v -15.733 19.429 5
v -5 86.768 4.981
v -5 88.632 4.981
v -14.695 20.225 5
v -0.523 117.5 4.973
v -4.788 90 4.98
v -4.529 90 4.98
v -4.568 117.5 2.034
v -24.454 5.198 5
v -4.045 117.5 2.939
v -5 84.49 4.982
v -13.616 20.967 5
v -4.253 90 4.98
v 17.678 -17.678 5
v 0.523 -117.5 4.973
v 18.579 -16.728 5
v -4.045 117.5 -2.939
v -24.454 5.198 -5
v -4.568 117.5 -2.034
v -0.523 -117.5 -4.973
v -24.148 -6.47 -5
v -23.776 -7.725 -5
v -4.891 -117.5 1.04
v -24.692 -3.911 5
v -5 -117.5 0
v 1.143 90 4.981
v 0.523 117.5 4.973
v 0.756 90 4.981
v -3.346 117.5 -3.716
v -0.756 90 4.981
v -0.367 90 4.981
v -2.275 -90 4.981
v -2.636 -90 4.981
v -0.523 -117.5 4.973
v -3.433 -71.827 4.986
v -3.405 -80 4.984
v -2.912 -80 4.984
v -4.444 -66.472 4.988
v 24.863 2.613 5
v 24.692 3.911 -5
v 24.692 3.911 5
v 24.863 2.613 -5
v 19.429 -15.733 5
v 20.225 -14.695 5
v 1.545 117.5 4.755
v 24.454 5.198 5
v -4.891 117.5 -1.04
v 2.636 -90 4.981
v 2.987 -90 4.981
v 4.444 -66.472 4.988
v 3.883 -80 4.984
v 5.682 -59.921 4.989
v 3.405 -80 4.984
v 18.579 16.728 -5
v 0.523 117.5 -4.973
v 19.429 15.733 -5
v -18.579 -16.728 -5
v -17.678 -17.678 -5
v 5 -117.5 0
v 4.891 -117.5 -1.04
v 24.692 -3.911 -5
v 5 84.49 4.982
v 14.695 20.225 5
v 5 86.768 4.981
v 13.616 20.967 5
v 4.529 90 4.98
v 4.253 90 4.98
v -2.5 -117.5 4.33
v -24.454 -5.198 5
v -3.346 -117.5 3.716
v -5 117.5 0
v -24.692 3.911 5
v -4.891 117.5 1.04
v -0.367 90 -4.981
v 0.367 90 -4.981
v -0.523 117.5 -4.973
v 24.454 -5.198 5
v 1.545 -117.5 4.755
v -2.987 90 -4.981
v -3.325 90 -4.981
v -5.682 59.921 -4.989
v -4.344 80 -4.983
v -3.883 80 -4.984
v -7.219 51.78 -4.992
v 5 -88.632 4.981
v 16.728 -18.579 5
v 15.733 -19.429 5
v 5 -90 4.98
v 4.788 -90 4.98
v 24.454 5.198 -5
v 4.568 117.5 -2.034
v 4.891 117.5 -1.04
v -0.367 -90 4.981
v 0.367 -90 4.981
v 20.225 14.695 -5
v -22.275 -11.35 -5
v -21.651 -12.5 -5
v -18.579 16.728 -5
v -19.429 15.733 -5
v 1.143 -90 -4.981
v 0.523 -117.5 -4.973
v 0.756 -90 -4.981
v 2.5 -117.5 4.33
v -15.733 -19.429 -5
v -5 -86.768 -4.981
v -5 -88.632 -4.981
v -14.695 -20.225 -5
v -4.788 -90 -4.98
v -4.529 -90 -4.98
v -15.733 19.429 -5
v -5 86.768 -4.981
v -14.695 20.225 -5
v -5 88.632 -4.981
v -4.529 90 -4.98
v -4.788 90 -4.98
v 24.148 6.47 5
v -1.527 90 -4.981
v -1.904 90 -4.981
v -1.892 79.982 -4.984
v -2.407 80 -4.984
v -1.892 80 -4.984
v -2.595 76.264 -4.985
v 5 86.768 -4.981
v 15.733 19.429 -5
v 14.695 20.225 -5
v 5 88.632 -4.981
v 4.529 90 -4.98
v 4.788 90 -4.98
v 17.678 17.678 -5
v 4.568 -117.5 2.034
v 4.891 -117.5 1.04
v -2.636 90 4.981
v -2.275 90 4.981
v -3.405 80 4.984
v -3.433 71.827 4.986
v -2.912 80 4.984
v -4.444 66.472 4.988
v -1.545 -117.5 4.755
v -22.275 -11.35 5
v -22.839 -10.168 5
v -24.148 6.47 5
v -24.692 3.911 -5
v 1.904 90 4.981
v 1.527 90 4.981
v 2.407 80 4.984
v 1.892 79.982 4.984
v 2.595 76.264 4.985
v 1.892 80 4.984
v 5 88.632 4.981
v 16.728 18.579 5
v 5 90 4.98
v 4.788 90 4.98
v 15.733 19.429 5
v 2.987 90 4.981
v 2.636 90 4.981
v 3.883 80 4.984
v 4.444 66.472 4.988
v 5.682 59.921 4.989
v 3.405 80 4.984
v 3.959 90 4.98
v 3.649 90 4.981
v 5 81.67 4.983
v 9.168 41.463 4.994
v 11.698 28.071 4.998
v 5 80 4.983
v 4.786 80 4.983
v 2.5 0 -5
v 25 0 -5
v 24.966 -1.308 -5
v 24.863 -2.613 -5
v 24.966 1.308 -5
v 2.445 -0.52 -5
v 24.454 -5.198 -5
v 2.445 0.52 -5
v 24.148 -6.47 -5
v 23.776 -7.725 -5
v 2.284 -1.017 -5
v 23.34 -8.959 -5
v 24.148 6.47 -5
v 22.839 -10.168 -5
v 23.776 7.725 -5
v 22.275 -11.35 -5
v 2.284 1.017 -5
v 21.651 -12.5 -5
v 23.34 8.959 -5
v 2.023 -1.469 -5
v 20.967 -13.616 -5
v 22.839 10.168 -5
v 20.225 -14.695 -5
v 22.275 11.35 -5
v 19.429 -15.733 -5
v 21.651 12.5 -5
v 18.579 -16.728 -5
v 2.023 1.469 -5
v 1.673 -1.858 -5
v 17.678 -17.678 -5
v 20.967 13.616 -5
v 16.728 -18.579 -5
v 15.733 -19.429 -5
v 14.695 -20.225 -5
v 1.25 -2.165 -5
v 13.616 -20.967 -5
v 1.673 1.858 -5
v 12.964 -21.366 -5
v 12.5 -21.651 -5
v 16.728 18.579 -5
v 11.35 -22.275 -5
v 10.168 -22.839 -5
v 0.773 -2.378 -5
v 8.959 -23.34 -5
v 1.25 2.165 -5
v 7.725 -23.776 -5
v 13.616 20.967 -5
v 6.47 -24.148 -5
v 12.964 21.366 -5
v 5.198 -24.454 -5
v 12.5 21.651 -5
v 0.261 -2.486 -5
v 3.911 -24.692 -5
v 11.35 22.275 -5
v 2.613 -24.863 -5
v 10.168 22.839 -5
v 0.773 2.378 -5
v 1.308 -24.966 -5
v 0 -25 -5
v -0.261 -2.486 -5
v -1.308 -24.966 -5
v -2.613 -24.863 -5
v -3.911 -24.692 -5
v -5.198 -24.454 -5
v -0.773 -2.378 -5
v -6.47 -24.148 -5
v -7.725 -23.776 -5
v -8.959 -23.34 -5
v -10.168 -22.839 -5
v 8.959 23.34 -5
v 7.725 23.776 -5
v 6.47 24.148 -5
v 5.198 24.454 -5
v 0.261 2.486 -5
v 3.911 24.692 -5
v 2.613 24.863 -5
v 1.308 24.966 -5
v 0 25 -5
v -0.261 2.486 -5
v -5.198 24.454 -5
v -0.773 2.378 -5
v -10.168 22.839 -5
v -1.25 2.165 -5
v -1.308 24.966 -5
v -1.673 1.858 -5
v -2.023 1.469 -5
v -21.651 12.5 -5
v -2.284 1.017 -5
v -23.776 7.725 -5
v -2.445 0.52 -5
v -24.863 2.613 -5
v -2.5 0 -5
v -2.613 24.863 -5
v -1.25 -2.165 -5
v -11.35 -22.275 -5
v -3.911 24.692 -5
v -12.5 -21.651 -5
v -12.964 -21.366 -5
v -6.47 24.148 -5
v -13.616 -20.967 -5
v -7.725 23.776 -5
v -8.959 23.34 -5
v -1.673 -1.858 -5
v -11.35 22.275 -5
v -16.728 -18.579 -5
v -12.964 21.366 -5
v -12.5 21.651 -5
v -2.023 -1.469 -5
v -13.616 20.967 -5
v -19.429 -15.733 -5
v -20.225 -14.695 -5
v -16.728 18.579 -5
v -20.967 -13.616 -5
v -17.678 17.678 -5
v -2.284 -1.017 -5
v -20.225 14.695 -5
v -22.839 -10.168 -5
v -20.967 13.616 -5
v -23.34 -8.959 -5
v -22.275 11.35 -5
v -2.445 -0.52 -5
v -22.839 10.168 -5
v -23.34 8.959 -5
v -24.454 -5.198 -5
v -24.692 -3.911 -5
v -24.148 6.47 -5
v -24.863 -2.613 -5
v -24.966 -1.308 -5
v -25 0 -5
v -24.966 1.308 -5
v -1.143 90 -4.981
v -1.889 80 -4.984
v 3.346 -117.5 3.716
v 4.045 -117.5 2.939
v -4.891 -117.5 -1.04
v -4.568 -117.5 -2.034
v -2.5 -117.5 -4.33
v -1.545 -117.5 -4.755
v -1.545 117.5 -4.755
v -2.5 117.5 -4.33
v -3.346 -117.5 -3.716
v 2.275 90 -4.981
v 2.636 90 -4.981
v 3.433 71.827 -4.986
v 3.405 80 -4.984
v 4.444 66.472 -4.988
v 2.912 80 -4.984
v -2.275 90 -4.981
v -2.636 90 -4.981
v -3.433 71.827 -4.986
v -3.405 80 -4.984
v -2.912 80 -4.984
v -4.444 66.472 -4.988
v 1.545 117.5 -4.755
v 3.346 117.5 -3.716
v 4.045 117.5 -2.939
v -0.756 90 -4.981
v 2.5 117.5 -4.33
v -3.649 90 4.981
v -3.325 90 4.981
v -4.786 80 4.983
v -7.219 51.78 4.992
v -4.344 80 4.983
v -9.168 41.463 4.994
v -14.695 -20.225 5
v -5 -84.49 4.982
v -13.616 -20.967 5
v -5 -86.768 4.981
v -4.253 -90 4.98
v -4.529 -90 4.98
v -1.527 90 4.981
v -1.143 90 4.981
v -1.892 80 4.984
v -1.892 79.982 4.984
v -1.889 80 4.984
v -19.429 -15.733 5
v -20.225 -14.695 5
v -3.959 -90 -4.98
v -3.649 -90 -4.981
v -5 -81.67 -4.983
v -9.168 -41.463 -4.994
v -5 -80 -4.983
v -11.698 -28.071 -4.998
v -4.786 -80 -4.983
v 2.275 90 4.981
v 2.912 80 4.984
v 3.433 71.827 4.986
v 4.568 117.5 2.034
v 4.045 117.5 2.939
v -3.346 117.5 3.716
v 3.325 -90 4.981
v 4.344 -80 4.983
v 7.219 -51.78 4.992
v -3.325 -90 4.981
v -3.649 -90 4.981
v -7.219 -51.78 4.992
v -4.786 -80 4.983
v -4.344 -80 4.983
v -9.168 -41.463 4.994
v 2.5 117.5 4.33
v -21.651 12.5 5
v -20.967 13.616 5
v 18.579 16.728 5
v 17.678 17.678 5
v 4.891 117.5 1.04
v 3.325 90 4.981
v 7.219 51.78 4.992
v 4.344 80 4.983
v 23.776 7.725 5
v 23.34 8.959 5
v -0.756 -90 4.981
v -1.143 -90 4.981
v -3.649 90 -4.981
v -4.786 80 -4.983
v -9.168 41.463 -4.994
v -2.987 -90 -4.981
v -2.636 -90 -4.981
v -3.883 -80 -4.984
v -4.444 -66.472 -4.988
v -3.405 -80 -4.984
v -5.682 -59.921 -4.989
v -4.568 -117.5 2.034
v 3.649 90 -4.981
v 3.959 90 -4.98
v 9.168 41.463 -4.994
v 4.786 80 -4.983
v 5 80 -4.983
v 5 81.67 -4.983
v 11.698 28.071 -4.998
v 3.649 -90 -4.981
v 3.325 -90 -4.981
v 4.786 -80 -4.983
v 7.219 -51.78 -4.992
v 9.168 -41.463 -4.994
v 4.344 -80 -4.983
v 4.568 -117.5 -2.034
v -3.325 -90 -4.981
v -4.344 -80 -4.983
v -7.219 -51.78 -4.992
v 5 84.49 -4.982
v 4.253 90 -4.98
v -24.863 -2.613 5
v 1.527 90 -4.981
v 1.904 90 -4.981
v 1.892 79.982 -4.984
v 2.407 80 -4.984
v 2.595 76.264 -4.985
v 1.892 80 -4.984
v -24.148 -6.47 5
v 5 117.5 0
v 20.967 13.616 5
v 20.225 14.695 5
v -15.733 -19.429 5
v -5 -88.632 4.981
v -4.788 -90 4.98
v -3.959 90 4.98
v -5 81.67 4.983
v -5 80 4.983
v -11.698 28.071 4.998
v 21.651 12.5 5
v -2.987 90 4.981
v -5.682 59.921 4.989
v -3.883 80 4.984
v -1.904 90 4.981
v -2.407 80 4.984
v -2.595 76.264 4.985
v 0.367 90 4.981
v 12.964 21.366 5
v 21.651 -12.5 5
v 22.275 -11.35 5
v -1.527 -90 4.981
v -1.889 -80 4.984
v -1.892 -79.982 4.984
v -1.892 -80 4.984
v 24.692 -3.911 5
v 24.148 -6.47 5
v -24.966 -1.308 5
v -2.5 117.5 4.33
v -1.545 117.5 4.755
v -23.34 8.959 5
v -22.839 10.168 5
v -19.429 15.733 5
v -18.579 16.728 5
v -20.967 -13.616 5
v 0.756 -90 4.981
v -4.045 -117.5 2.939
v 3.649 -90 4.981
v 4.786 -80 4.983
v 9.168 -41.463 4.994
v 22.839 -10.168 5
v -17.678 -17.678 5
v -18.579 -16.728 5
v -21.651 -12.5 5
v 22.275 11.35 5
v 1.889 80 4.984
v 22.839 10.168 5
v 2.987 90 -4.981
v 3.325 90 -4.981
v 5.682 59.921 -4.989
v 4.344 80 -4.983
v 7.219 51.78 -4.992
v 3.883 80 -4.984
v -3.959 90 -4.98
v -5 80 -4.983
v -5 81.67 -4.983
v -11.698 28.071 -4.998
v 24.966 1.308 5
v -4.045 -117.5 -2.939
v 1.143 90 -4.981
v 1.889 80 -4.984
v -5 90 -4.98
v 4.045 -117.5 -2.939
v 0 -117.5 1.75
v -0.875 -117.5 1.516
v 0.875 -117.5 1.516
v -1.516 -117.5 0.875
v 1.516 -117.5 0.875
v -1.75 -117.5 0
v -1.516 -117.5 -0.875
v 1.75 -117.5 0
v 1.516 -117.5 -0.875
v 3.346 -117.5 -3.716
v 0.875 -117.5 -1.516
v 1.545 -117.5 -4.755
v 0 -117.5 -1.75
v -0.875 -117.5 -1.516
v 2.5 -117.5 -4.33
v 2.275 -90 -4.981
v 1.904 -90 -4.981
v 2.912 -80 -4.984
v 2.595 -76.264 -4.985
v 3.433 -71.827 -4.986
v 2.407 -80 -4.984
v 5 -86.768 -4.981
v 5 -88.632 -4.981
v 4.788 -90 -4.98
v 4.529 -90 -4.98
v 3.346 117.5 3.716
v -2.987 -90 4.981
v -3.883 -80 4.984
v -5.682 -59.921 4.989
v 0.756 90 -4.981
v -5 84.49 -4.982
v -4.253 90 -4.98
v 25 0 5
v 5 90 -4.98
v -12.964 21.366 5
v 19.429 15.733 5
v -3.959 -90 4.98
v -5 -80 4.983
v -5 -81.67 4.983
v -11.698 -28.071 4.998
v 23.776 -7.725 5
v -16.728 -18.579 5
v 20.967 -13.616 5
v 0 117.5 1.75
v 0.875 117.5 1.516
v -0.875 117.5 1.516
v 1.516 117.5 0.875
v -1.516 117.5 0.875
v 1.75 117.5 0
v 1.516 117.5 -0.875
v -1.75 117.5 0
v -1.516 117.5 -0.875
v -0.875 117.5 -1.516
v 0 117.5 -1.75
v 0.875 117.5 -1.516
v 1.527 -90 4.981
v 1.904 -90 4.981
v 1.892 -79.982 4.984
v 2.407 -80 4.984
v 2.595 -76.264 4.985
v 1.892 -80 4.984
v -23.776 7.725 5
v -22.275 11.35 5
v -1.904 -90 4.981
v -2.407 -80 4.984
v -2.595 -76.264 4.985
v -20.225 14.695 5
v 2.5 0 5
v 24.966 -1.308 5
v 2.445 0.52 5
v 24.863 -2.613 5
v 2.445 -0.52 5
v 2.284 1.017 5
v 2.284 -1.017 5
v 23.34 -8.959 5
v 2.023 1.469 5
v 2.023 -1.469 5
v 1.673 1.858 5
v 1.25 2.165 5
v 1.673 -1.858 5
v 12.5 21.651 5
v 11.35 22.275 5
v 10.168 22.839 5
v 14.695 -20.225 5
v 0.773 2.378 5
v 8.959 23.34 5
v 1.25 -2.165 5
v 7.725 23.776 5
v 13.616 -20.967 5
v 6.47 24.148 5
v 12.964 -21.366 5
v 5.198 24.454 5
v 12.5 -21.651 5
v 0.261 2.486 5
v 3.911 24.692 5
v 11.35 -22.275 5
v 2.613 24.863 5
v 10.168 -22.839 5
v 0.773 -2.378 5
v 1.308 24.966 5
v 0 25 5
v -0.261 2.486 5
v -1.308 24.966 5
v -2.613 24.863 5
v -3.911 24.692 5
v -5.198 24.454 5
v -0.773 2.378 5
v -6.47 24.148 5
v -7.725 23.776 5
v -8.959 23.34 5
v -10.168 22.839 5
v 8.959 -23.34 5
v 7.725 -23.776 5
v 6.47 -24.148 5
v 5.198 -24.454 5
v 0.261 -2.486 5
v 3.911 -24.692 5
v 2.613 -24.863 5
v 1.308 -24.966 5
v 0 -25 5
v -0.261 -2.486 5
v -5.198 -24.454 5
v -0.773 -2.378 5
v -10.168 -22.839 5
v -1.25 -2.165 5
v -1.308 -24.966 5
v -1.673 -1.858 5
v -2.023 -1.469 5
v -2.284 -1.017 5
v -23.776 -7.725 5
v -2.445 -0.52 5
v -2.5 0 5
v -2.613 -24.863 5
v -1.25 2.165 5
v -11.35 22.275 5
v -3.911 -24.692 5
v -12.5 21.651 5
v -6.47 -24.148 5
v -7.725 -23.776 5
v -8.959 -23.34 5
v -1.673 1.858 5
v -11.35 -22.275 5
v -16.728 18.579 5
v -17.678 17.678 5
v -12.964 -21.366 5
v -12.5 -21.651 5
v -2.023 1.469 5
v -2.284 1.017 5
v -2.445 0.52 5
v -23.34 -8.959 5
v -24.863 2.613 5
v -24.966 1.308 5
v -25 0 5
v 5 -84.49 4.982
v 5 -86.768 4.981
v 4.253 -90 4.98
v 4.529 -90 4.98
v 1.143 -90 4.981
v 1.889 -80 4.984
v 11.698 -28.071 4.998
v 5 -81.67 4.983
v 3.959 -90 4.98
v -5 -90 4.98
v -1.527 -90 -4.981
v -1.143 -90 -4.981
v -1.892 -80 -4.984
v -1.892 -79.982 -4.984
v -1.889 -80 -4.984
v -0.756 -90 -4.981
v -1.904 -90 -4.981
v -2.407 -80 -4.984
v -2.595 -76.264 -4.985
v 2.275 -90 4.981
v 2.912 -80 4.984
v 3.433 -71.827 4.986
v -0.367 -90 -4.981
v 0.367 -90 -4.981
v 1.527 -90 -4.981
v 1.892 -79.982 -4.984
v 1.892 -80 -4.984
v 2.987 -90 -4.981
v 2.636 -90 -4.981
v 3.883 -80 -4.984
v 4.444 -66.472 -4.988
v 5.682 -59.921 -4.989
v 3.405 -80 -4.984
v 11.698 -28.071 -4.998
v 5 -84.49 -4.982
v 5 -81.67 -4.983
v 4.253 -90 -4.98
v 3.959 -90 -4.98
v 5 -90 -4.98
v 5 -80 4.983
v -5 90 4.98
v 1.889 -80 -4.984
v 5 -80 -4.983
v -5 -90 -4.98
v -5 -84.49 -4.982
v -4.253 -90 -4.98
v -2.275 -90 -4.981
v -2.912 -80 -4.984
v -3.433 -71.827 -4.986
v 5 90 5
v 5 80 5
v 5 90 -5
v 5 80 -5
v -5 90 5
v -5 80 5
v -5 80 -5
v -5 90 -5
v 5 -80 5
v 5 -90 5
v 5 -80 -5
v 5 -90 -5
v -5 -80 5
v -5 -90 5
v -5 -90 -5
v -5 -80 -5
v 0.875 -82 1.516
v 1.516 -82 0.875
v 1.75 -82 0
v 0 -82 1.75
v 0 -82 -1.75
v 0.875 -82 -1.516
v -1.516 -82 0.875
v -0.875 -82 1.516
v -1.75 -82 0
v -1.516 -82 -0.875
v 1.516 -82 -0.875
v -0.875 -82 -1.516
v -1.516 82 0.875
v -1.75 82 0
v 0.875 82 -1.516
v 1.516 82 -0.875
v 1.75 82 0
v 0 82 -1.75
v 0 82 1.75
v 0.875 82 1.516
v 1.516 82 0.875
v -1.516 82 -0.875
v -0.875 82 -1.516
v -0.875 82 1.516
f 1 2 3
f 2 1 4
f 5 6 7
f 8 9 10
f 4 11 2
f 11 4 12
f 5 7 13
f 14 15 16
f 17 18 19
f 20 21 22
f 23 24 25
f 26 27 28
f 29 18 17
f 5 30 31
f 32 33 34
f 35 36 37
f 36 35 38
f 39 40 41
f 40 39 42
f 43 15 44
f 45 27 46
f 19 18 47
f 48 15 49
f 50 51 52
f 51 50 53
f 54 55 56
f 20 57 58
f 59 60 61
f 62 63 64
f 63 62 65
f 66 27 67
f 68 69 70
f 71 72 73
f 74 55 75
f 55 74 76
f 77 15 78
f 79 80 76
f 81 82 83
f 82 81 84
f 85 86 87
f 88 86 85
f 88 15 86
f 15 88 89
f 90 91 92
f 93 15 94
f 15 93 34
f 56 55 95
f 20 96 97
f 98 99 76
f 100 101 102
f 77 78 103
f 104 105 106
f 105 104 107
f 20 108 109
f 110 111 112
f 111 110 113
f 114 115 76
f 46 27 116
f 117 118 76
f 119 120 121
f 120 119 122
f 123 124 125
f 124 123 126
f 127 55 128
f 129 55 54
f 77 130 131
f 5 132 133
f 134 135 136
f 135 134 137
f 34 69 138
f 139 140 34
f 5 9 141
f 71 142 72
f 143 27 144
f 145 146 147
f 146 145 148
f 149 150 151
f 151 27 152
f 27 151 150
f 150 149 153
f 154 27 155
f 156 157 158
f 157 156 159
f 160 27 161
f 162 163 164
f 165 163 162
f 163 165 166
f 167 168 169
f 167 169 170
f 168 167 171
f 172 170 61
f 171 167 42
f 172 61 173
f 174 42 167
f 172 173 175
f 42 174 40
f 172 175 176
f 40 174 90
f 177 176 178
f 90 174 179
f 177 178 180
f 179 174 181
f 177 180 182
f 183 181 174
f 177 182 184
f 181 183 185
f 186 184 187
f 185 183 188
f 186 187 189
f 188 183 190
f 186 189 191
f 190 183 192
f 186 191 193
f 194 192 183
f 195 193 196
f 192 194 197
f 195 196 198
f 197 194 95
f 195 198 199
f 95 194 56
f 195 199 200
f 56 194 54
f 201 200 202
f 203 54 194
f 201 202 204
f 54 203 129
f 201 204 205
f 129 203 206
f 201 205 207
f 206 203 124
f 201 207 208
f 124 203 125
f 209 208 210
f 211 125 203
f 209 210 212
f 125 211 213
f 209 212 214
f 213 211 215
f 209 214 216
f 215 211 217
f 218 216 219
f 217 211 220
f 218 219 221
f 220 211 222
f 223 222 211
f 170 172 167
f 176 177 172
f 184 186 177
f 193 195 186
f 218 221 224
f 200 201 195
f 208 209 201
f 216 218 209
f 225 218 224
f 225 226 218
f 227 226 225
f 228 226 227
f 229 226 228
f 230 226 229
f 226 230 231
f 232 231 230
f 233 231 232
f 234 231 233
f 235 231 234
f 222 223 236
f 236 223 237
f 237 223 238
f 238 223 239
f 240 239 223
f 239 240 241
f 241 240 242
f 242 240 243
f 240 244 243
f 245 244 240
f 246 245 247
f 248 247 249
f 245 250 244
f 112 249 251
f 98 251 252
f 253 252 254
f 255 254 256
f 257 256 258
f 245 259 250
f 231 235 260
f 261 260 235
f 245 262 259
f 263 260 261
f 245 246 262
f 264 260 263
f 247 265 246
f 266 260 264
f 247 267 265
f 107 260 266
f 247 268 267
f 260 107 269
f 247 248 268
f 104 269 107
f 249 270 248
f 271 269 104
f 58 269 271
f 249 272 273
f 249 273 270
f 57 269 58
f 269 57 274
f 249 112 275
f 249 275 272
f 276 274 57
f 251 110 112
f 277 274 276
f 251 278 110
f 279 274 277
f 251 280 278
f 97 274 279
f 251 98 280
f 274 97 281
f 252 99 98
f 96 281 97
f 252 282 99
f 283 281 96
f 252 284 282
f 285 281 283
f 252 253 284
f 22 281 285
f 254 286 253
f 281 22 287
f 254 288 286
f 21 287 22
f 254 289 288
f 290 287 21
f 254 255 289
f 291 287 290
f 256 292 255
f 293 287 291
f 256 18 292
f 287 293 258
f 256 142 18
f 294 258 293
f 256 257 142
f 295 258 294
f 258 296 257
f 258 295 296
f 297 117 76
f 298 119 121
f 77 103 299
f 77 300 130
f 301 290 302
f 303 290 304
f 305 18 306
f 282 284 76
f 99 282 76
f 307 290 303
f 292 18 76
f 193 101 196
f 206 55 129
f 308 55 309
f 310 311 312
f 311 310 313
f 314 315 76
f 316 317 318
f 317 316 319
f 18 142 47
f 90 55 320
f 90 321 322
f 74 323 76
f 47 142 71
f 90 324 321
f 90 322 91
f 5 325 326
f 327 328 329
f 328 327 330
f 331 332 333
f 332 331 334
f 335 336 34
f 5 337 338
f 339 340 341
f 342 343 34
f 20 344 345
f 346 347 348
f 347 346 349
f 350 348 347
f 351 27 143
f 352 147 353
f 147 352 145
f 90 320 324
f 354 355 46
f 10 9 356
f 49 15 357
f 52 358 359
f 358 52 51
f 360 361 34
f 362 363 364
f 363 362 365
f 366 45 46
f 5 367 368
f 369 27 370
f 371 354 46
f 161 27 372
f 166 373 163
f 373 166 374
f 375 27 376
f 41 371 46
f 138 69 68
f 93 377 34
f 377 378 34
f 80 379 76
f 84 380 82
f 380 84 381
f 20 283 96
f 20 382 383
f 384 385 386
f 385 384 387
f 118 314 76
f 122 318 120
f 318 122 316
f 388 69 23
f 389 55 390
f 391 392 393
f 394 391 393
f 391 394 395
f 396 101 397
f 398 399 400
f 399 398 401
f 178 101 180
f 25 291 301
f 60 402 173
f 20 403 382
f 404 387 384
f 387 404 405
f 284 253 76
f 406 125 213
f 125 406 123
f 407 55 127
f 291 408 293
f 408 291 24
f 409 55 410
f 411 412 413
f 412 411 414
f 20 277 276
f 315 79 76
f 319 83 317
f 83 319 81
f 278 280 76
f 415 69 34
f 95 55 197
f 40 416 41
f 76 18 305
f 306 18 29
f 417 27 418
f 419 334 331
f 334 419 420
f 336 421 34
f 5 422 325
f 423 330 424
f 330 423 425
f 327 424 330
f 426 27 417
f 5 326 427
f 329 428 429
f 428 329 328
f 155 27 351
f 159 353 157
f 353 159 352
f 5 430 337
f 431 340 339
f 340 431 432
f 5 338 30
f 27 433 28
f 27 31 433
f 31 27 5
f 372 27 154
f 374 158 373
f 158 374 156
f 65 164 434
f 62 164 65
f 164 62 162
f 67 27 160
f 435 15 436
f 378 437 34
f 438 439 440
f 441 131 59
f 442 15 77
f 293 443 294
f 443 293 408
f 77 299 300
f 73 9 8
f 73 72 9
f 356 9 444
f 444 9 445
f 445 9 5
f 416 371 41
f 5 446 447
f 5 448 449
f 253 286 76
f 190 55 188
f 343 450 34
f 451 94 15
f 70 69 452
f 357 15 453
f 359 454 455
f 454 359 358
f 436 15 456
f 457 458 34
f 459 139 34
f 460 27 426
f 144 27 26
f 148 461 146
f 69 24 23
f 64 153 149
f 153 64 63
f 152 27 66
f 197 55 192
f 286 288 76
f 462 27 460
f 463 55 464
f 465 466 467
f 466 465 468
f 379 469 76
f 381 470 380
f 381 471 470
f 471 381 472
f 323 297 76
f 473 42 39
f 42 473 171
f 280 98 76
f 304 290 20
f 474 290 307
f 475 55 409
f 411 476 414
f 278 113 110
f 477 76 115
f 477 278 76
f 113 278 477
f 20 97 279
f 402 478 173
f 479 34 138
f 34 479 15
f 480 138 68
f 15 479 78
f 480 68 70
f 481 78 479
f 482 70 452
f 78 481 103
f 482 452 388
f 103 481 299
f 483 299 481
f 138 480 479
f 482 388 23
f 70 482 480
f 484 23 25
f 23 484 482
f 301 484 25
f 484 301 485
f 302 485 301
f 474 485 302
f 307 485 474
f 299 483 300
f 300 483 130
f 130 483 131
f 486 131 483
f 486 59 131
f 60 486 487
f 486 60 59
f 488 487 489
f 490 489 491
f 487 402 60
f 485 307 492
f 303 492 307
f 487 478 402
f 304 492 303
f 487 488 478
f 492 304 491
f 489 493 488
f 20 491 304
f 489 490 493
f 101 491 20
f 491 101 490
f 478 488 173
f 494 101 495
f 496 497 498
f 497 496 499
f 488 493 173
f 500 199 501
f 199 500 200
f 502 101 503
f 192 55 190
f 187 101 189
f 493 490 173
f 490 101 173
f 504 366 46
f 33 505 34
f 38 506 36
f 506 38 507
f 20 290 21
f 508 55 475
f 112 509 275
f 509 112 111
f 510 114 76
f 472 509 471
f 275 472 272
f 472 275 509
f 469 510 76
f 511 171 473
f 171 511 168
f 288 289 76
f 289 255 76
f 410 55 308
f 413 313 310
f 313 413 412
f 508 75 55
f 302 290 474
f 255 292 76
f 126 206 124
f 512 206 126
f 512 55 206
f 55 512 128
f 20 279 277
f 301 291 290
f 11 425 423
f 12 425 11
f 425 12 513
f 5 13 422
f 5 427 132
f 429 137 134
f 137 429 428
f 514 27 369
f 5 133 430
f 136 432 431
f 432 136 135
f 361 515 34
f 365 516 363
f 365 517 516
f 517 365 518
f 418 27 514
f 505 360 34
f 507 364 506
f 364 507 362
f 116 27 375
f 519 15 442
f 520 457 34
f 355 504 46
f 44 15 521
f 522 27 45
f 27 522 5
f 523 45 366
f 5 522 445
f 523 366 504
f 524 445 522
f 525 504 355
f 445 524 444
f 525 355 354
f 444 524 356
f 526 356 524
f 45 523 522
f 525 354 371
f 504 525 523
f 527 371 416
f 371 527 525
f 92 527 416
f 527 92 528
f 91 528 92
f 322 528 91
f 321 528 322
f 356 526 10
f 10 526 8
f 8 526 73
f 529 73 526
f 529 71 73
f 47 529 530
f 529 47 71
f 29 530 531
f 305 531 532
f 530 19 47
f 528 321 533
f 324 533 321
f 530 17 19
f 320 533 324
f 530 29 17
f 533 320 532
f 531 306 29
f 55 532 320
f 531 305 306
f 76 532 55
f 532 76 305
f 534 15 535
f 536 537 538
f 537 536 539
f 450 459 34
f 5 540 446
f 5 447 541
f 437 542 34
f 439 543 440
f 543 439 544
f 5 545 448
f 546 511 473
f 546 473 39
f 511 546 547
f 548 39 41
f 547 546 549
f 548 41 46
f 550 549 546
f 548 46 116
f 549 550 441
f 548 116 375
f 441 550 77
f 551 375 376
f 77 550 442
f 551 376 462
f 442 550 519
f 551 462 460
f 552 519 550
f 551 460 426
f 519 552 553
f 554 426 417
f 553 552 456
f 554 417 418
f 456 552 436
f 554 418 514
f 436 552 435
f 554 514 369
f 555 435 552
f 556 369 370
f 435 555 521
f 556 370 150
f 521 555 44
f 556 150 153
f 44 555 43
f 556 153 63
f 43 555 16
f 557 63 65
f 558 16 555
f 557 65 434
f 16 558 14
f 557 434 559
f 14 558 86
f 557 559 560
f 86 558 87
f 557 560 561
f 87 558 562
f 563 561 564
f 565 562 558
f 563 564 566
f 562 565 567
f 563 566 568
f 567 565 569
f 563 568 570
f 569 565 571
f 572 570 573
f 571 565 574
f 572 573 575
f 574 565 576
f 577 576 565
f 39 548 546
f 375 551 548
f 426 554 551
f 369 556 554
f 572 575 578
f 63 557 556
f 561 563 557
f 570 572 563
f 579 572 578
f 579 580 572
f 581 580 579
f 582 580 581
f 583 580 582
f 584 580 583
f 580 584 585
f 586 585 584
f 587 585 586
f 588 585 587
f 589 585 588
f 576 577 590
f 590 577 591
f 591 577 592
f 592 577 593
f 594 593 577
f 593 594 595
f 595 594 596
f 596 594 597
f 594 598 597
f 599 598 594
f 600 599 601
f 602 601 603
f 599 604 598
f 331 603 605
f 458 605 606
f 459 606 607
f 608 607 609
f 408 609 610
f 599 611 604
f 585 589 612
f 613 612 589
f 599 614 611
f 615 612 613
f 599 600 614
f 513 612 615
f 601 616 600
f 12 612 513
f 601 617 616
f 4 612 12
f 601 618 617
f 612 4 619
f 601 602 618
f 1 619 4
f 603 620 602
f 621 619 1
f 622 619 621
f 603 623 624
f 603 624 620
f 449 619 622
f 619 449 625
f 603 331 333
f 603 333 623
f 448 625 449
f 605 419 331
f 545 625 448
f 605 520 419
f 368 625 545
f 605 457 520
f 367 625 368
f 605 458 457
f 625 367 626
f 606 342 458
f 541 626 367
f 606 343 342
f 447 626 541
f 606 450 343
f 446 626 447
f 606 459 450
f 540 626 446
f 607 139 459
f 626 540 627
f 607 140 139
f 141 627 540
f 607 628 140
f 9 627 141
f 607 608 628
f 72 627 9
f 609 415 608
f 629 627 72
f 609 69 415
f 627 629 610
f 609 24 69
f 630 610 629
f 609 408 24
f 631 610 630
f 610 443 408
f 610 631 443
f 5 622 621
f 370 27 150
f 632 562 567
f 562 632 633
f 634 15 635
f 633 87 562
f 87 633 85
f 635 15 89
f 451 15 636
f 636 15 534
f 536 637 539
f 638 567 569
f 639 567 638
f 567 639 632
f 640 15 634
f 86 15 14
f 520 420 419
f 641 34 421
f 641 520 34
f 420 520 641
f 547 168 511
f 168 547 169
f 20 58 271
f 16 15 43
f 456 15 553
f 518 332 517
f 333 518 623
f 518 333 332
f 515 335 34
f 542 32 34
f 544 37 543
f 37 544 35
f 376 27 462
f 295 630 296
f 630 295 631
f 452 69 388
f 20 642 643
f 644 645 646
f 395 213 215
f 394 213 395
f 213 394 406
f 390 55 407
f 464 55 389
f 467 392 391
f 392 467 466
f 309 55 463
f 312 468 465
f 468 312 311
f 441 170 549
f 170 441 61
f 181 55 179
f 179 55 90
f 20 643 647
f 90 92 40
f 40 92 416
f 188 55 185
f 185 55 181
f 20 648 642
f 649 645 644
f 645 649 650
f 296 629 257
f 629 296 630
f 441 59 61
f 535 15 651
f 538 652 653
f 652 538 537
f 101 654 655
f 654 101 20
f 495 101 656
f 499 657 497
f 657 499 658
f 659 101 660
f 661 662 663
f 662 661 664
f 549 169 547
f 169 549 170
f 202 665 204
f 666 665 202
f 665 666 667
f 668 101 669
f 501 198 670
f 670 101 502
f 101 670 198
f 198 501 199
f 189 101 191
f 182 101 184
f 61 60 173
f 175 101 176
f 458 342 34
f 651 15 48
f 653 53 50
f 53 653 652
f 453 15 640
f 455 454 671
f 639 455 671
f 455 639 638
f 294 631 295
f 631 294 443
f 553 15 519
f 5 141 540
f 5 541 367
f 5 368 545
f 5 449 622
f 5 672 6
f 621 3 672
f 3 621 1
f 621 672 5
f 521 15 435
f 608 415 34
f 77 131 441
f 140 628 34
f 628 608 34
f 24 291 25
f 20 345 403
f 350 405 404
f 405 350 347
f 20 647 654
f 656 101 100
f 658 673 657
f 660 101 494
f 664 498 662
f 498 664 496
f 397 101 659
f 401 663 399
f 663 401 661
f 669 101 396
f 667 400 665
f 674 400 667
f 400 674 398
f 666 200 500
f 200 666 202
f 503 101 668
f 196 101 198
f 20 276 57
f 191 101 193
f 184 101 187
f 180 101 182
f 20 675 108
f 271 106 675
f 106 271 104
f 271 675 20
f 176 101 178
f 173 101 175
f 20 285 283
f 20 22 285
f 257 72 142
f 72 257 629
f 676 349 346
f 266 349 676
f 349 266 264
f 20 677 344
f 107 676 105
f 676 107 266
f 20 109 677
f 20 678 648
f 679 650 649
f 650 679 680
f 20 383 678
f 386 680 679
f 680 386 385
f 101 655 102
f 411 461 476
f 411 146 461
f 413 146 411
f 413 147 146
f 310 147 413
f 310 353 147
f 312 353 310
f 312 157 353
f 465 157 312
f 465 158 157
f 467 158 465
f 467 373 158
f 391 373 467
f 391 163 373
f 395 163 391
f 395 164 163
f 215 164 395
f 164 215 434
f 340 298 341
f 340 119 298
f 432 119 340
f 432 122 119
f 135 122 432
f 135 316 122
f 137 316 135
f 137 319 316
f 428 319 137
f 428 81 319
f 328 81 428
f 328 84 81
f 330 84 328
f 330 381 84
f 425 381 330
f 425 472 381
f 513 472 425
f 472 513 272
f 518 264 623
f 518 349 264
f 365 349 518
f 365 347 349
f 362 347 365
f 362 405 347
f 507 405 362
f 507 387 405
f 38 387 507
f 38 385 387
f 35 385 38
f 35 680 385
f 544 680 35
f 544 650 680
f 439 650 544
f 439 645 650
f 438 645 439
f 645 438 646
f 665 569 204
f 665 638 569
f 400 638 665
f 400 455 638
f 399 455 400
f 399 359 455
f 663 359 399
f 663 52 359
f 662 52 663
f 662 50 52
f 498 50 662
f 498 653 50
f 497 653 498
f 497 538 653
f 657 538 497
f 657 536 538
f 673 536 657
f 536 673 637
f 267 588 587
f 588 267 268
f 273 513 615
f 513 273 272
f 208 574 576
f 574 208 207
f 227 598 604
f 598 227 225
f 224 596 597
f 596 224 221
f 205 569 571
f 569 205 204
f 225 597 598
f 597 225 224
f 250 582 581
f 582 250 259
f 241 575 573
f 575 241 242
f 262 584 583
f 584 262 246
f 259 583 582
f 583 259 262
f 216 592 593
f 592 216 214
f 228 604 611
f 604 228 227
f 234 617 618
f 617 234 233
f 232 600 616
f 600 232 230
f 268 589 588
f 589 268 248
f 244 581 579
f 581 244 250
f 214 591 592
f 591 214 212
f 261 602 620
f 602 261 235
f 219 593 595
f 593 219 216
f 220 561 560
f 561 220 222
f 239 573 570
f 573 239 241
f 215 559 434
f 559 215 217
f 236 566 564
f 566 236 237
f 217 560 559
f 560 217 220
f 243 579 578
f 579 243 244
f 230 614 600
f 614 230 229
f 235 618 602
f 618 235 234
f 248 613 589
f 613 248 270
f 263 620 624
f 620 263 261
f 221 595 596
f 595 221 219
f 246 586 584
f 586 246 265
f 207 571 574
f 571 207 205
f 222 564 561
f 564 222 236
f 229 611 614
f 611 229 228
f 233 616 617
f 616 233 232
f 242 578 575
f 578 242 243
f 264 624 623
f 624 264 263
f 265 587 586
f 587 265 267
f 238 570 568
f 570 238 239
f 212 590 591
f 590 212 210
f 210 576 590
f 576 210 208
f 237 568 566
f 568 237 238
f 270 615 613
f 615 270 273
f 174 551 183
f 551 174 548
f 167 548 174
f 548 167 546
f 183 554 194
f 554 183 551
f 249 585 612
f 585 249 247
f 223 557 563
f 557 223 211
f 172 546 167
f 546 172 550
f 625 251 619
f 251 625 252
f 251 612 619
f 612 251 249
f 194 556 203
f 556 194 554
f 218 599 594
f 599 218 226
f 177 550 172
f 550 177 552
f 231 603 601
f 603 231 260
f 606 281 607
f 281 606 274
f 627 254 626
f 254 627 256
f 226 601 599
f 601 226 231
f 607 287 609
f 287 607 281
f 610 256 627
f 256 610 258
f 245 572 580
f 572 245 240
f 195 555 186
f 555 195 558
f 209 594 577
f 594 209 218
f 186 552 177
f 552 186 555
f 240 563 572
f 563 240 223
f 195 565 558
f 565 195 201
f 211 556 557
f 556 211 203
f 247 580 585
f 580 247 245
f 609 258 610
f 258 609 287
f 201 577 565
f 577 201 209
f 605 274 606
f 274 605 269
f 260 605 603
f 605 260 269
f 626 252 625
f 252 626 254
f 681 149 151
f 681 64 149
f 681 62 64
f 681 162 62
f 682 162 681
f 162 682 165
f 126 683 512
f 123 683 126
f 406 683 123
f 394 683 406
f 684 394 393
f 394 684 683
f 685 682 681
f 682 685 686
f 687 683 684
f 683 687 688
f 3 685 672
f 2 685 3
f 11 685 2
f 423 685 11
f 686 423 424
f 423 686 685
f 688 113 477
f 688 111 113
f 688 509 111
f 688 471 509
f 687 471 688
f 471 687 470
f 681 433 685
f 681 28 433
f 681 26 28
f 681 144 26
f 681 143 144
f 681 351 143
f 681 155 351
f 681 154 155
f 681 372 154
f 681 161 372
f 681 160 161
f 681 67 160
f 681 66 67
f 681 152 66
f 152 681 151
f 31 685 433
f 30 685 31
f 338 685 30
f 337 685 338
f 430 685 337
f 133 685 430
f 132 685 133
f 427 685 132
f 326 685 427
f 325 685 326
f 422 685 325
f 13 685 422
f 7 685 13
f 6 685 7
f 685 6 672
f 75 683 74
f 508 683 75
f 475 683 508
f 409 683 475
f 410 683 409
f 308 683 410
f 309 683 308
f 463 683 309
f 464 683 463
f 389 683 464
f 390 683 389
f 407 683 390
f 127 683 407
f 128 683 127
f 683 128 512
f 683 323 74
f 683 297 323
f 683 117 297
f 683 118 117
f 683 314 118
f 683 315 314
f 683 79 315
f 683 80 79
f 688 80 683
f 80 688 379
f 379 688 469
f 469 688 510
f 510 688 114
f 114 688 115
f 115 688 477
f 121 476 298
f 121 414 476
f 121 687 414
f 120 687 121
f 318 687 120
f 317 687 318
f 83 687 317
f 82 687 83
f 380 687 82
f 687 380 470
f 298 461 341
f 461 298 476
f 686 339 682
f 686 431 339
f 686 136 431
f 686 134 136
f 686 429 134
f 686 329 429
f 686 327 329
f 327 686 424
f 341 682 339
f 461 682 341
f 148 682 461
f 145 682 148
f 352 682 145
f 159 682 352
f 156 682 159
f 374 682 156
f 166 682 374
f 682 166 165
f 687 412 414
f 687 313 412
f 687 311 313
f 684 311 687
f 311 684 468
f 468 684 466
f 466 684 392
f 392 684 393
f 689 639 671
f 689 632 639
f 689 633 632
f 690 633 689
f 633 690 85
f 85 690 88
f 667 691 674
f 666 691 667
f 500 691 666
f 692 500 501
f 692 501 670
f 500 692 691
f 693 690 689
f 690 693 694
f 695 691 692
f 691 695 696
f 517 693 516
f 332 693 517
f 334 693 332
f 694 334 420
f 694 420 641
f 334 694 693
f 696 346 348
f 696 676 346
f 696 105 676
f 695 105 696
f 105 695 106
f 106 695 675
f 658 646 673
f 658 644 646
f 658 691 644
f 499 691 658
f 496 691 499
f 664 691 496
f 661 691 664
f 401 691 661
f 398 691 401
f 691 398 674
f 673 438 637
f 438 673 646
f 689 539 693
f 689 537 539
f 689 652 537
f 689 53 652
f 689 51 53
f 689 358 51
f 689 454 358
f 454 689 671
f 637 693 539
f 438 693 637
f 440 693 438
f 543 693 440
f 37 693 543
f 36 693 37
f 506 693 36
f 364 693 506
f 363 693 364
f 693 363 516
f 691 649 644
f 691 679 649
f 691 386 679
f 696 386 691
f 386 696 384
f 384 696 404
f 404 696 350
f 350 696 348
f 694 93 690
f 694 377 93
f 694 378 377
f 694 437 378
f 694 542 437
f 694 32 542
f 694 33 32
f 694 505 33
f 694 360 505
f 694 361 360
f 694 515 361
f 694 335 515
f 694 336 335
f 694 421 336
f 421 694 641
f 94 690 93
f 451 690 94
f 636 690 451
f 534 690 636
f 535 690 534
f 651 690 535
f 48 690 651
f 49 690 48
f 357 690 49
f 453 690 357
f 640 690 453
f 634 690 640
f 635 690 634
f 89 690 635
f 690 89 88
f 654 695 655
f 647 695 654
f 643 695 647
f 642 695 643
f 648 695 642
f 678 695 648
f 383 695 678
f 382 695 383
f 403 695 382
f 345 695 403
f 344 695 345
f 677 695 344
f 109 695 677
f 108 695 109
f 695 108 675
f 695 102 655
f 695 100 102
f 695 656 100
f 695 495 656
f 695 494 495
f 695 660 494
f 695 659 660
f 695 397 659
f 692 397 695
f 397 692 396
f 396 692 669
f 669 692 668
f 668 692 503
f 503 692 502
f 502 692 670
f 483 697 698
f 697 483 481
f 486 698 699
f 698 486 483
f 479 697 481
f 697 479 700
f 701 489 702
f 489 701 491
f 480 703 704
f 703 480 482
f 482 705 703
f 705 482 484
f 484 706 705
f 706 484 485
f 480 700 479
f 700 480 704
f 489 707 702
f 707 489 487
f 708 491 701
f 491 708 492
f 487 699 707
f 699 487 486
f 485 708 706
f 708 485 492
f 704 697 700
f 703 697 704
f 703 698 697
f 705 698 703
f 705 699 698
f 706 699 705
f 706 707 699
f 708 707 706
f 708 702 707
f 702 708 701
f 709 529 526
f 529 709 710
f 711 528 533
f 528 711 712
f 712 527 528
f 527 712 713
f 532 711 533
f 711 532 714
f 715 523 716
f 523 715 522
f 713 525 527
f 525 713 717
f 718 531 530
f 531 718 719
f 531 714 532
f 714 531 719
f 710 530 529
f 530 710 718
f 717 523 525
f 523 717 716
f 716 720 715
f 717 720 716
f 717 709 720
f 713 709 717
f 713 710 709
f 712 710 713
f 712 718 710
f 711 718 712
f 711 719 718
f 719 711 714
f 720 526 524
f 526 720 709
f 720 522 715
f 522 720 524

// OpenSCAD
difference(){
union(){
difference(){
hull(){
cylinder(d=50,h=10,center=true,$fn=120);
rotate([90,0,0])
cylinder(d=10,h=235,center=true,$fn=30);
}
translate([0,0,-5])linear_extrude(10)
polygon([[17,0],[0,90],[-17,0]]);
rotate([0,0,180])
translate([0,0,-5])linear_extrude(10)
polygon([[17,0],[0,90],[-17,0]]);
}
difference(){
cylinder(d=50,h=10,center=true,$fn=120);
cylinder(d=5,h=10,center=true,$fn=30);
}
translate([0,85,0])
cube([10,10,10],center=true);
translate([0,-85,0])
cube([10,10,10],center=true);
}
translate([0,-82,0])rotate([90,0,0])
cylinder(d=3.5,h=50,$fn=12);
translate([0,82,0])rotate([-90,0,0])
cylinder(d=3.5,h=50,$fn=12);
}
